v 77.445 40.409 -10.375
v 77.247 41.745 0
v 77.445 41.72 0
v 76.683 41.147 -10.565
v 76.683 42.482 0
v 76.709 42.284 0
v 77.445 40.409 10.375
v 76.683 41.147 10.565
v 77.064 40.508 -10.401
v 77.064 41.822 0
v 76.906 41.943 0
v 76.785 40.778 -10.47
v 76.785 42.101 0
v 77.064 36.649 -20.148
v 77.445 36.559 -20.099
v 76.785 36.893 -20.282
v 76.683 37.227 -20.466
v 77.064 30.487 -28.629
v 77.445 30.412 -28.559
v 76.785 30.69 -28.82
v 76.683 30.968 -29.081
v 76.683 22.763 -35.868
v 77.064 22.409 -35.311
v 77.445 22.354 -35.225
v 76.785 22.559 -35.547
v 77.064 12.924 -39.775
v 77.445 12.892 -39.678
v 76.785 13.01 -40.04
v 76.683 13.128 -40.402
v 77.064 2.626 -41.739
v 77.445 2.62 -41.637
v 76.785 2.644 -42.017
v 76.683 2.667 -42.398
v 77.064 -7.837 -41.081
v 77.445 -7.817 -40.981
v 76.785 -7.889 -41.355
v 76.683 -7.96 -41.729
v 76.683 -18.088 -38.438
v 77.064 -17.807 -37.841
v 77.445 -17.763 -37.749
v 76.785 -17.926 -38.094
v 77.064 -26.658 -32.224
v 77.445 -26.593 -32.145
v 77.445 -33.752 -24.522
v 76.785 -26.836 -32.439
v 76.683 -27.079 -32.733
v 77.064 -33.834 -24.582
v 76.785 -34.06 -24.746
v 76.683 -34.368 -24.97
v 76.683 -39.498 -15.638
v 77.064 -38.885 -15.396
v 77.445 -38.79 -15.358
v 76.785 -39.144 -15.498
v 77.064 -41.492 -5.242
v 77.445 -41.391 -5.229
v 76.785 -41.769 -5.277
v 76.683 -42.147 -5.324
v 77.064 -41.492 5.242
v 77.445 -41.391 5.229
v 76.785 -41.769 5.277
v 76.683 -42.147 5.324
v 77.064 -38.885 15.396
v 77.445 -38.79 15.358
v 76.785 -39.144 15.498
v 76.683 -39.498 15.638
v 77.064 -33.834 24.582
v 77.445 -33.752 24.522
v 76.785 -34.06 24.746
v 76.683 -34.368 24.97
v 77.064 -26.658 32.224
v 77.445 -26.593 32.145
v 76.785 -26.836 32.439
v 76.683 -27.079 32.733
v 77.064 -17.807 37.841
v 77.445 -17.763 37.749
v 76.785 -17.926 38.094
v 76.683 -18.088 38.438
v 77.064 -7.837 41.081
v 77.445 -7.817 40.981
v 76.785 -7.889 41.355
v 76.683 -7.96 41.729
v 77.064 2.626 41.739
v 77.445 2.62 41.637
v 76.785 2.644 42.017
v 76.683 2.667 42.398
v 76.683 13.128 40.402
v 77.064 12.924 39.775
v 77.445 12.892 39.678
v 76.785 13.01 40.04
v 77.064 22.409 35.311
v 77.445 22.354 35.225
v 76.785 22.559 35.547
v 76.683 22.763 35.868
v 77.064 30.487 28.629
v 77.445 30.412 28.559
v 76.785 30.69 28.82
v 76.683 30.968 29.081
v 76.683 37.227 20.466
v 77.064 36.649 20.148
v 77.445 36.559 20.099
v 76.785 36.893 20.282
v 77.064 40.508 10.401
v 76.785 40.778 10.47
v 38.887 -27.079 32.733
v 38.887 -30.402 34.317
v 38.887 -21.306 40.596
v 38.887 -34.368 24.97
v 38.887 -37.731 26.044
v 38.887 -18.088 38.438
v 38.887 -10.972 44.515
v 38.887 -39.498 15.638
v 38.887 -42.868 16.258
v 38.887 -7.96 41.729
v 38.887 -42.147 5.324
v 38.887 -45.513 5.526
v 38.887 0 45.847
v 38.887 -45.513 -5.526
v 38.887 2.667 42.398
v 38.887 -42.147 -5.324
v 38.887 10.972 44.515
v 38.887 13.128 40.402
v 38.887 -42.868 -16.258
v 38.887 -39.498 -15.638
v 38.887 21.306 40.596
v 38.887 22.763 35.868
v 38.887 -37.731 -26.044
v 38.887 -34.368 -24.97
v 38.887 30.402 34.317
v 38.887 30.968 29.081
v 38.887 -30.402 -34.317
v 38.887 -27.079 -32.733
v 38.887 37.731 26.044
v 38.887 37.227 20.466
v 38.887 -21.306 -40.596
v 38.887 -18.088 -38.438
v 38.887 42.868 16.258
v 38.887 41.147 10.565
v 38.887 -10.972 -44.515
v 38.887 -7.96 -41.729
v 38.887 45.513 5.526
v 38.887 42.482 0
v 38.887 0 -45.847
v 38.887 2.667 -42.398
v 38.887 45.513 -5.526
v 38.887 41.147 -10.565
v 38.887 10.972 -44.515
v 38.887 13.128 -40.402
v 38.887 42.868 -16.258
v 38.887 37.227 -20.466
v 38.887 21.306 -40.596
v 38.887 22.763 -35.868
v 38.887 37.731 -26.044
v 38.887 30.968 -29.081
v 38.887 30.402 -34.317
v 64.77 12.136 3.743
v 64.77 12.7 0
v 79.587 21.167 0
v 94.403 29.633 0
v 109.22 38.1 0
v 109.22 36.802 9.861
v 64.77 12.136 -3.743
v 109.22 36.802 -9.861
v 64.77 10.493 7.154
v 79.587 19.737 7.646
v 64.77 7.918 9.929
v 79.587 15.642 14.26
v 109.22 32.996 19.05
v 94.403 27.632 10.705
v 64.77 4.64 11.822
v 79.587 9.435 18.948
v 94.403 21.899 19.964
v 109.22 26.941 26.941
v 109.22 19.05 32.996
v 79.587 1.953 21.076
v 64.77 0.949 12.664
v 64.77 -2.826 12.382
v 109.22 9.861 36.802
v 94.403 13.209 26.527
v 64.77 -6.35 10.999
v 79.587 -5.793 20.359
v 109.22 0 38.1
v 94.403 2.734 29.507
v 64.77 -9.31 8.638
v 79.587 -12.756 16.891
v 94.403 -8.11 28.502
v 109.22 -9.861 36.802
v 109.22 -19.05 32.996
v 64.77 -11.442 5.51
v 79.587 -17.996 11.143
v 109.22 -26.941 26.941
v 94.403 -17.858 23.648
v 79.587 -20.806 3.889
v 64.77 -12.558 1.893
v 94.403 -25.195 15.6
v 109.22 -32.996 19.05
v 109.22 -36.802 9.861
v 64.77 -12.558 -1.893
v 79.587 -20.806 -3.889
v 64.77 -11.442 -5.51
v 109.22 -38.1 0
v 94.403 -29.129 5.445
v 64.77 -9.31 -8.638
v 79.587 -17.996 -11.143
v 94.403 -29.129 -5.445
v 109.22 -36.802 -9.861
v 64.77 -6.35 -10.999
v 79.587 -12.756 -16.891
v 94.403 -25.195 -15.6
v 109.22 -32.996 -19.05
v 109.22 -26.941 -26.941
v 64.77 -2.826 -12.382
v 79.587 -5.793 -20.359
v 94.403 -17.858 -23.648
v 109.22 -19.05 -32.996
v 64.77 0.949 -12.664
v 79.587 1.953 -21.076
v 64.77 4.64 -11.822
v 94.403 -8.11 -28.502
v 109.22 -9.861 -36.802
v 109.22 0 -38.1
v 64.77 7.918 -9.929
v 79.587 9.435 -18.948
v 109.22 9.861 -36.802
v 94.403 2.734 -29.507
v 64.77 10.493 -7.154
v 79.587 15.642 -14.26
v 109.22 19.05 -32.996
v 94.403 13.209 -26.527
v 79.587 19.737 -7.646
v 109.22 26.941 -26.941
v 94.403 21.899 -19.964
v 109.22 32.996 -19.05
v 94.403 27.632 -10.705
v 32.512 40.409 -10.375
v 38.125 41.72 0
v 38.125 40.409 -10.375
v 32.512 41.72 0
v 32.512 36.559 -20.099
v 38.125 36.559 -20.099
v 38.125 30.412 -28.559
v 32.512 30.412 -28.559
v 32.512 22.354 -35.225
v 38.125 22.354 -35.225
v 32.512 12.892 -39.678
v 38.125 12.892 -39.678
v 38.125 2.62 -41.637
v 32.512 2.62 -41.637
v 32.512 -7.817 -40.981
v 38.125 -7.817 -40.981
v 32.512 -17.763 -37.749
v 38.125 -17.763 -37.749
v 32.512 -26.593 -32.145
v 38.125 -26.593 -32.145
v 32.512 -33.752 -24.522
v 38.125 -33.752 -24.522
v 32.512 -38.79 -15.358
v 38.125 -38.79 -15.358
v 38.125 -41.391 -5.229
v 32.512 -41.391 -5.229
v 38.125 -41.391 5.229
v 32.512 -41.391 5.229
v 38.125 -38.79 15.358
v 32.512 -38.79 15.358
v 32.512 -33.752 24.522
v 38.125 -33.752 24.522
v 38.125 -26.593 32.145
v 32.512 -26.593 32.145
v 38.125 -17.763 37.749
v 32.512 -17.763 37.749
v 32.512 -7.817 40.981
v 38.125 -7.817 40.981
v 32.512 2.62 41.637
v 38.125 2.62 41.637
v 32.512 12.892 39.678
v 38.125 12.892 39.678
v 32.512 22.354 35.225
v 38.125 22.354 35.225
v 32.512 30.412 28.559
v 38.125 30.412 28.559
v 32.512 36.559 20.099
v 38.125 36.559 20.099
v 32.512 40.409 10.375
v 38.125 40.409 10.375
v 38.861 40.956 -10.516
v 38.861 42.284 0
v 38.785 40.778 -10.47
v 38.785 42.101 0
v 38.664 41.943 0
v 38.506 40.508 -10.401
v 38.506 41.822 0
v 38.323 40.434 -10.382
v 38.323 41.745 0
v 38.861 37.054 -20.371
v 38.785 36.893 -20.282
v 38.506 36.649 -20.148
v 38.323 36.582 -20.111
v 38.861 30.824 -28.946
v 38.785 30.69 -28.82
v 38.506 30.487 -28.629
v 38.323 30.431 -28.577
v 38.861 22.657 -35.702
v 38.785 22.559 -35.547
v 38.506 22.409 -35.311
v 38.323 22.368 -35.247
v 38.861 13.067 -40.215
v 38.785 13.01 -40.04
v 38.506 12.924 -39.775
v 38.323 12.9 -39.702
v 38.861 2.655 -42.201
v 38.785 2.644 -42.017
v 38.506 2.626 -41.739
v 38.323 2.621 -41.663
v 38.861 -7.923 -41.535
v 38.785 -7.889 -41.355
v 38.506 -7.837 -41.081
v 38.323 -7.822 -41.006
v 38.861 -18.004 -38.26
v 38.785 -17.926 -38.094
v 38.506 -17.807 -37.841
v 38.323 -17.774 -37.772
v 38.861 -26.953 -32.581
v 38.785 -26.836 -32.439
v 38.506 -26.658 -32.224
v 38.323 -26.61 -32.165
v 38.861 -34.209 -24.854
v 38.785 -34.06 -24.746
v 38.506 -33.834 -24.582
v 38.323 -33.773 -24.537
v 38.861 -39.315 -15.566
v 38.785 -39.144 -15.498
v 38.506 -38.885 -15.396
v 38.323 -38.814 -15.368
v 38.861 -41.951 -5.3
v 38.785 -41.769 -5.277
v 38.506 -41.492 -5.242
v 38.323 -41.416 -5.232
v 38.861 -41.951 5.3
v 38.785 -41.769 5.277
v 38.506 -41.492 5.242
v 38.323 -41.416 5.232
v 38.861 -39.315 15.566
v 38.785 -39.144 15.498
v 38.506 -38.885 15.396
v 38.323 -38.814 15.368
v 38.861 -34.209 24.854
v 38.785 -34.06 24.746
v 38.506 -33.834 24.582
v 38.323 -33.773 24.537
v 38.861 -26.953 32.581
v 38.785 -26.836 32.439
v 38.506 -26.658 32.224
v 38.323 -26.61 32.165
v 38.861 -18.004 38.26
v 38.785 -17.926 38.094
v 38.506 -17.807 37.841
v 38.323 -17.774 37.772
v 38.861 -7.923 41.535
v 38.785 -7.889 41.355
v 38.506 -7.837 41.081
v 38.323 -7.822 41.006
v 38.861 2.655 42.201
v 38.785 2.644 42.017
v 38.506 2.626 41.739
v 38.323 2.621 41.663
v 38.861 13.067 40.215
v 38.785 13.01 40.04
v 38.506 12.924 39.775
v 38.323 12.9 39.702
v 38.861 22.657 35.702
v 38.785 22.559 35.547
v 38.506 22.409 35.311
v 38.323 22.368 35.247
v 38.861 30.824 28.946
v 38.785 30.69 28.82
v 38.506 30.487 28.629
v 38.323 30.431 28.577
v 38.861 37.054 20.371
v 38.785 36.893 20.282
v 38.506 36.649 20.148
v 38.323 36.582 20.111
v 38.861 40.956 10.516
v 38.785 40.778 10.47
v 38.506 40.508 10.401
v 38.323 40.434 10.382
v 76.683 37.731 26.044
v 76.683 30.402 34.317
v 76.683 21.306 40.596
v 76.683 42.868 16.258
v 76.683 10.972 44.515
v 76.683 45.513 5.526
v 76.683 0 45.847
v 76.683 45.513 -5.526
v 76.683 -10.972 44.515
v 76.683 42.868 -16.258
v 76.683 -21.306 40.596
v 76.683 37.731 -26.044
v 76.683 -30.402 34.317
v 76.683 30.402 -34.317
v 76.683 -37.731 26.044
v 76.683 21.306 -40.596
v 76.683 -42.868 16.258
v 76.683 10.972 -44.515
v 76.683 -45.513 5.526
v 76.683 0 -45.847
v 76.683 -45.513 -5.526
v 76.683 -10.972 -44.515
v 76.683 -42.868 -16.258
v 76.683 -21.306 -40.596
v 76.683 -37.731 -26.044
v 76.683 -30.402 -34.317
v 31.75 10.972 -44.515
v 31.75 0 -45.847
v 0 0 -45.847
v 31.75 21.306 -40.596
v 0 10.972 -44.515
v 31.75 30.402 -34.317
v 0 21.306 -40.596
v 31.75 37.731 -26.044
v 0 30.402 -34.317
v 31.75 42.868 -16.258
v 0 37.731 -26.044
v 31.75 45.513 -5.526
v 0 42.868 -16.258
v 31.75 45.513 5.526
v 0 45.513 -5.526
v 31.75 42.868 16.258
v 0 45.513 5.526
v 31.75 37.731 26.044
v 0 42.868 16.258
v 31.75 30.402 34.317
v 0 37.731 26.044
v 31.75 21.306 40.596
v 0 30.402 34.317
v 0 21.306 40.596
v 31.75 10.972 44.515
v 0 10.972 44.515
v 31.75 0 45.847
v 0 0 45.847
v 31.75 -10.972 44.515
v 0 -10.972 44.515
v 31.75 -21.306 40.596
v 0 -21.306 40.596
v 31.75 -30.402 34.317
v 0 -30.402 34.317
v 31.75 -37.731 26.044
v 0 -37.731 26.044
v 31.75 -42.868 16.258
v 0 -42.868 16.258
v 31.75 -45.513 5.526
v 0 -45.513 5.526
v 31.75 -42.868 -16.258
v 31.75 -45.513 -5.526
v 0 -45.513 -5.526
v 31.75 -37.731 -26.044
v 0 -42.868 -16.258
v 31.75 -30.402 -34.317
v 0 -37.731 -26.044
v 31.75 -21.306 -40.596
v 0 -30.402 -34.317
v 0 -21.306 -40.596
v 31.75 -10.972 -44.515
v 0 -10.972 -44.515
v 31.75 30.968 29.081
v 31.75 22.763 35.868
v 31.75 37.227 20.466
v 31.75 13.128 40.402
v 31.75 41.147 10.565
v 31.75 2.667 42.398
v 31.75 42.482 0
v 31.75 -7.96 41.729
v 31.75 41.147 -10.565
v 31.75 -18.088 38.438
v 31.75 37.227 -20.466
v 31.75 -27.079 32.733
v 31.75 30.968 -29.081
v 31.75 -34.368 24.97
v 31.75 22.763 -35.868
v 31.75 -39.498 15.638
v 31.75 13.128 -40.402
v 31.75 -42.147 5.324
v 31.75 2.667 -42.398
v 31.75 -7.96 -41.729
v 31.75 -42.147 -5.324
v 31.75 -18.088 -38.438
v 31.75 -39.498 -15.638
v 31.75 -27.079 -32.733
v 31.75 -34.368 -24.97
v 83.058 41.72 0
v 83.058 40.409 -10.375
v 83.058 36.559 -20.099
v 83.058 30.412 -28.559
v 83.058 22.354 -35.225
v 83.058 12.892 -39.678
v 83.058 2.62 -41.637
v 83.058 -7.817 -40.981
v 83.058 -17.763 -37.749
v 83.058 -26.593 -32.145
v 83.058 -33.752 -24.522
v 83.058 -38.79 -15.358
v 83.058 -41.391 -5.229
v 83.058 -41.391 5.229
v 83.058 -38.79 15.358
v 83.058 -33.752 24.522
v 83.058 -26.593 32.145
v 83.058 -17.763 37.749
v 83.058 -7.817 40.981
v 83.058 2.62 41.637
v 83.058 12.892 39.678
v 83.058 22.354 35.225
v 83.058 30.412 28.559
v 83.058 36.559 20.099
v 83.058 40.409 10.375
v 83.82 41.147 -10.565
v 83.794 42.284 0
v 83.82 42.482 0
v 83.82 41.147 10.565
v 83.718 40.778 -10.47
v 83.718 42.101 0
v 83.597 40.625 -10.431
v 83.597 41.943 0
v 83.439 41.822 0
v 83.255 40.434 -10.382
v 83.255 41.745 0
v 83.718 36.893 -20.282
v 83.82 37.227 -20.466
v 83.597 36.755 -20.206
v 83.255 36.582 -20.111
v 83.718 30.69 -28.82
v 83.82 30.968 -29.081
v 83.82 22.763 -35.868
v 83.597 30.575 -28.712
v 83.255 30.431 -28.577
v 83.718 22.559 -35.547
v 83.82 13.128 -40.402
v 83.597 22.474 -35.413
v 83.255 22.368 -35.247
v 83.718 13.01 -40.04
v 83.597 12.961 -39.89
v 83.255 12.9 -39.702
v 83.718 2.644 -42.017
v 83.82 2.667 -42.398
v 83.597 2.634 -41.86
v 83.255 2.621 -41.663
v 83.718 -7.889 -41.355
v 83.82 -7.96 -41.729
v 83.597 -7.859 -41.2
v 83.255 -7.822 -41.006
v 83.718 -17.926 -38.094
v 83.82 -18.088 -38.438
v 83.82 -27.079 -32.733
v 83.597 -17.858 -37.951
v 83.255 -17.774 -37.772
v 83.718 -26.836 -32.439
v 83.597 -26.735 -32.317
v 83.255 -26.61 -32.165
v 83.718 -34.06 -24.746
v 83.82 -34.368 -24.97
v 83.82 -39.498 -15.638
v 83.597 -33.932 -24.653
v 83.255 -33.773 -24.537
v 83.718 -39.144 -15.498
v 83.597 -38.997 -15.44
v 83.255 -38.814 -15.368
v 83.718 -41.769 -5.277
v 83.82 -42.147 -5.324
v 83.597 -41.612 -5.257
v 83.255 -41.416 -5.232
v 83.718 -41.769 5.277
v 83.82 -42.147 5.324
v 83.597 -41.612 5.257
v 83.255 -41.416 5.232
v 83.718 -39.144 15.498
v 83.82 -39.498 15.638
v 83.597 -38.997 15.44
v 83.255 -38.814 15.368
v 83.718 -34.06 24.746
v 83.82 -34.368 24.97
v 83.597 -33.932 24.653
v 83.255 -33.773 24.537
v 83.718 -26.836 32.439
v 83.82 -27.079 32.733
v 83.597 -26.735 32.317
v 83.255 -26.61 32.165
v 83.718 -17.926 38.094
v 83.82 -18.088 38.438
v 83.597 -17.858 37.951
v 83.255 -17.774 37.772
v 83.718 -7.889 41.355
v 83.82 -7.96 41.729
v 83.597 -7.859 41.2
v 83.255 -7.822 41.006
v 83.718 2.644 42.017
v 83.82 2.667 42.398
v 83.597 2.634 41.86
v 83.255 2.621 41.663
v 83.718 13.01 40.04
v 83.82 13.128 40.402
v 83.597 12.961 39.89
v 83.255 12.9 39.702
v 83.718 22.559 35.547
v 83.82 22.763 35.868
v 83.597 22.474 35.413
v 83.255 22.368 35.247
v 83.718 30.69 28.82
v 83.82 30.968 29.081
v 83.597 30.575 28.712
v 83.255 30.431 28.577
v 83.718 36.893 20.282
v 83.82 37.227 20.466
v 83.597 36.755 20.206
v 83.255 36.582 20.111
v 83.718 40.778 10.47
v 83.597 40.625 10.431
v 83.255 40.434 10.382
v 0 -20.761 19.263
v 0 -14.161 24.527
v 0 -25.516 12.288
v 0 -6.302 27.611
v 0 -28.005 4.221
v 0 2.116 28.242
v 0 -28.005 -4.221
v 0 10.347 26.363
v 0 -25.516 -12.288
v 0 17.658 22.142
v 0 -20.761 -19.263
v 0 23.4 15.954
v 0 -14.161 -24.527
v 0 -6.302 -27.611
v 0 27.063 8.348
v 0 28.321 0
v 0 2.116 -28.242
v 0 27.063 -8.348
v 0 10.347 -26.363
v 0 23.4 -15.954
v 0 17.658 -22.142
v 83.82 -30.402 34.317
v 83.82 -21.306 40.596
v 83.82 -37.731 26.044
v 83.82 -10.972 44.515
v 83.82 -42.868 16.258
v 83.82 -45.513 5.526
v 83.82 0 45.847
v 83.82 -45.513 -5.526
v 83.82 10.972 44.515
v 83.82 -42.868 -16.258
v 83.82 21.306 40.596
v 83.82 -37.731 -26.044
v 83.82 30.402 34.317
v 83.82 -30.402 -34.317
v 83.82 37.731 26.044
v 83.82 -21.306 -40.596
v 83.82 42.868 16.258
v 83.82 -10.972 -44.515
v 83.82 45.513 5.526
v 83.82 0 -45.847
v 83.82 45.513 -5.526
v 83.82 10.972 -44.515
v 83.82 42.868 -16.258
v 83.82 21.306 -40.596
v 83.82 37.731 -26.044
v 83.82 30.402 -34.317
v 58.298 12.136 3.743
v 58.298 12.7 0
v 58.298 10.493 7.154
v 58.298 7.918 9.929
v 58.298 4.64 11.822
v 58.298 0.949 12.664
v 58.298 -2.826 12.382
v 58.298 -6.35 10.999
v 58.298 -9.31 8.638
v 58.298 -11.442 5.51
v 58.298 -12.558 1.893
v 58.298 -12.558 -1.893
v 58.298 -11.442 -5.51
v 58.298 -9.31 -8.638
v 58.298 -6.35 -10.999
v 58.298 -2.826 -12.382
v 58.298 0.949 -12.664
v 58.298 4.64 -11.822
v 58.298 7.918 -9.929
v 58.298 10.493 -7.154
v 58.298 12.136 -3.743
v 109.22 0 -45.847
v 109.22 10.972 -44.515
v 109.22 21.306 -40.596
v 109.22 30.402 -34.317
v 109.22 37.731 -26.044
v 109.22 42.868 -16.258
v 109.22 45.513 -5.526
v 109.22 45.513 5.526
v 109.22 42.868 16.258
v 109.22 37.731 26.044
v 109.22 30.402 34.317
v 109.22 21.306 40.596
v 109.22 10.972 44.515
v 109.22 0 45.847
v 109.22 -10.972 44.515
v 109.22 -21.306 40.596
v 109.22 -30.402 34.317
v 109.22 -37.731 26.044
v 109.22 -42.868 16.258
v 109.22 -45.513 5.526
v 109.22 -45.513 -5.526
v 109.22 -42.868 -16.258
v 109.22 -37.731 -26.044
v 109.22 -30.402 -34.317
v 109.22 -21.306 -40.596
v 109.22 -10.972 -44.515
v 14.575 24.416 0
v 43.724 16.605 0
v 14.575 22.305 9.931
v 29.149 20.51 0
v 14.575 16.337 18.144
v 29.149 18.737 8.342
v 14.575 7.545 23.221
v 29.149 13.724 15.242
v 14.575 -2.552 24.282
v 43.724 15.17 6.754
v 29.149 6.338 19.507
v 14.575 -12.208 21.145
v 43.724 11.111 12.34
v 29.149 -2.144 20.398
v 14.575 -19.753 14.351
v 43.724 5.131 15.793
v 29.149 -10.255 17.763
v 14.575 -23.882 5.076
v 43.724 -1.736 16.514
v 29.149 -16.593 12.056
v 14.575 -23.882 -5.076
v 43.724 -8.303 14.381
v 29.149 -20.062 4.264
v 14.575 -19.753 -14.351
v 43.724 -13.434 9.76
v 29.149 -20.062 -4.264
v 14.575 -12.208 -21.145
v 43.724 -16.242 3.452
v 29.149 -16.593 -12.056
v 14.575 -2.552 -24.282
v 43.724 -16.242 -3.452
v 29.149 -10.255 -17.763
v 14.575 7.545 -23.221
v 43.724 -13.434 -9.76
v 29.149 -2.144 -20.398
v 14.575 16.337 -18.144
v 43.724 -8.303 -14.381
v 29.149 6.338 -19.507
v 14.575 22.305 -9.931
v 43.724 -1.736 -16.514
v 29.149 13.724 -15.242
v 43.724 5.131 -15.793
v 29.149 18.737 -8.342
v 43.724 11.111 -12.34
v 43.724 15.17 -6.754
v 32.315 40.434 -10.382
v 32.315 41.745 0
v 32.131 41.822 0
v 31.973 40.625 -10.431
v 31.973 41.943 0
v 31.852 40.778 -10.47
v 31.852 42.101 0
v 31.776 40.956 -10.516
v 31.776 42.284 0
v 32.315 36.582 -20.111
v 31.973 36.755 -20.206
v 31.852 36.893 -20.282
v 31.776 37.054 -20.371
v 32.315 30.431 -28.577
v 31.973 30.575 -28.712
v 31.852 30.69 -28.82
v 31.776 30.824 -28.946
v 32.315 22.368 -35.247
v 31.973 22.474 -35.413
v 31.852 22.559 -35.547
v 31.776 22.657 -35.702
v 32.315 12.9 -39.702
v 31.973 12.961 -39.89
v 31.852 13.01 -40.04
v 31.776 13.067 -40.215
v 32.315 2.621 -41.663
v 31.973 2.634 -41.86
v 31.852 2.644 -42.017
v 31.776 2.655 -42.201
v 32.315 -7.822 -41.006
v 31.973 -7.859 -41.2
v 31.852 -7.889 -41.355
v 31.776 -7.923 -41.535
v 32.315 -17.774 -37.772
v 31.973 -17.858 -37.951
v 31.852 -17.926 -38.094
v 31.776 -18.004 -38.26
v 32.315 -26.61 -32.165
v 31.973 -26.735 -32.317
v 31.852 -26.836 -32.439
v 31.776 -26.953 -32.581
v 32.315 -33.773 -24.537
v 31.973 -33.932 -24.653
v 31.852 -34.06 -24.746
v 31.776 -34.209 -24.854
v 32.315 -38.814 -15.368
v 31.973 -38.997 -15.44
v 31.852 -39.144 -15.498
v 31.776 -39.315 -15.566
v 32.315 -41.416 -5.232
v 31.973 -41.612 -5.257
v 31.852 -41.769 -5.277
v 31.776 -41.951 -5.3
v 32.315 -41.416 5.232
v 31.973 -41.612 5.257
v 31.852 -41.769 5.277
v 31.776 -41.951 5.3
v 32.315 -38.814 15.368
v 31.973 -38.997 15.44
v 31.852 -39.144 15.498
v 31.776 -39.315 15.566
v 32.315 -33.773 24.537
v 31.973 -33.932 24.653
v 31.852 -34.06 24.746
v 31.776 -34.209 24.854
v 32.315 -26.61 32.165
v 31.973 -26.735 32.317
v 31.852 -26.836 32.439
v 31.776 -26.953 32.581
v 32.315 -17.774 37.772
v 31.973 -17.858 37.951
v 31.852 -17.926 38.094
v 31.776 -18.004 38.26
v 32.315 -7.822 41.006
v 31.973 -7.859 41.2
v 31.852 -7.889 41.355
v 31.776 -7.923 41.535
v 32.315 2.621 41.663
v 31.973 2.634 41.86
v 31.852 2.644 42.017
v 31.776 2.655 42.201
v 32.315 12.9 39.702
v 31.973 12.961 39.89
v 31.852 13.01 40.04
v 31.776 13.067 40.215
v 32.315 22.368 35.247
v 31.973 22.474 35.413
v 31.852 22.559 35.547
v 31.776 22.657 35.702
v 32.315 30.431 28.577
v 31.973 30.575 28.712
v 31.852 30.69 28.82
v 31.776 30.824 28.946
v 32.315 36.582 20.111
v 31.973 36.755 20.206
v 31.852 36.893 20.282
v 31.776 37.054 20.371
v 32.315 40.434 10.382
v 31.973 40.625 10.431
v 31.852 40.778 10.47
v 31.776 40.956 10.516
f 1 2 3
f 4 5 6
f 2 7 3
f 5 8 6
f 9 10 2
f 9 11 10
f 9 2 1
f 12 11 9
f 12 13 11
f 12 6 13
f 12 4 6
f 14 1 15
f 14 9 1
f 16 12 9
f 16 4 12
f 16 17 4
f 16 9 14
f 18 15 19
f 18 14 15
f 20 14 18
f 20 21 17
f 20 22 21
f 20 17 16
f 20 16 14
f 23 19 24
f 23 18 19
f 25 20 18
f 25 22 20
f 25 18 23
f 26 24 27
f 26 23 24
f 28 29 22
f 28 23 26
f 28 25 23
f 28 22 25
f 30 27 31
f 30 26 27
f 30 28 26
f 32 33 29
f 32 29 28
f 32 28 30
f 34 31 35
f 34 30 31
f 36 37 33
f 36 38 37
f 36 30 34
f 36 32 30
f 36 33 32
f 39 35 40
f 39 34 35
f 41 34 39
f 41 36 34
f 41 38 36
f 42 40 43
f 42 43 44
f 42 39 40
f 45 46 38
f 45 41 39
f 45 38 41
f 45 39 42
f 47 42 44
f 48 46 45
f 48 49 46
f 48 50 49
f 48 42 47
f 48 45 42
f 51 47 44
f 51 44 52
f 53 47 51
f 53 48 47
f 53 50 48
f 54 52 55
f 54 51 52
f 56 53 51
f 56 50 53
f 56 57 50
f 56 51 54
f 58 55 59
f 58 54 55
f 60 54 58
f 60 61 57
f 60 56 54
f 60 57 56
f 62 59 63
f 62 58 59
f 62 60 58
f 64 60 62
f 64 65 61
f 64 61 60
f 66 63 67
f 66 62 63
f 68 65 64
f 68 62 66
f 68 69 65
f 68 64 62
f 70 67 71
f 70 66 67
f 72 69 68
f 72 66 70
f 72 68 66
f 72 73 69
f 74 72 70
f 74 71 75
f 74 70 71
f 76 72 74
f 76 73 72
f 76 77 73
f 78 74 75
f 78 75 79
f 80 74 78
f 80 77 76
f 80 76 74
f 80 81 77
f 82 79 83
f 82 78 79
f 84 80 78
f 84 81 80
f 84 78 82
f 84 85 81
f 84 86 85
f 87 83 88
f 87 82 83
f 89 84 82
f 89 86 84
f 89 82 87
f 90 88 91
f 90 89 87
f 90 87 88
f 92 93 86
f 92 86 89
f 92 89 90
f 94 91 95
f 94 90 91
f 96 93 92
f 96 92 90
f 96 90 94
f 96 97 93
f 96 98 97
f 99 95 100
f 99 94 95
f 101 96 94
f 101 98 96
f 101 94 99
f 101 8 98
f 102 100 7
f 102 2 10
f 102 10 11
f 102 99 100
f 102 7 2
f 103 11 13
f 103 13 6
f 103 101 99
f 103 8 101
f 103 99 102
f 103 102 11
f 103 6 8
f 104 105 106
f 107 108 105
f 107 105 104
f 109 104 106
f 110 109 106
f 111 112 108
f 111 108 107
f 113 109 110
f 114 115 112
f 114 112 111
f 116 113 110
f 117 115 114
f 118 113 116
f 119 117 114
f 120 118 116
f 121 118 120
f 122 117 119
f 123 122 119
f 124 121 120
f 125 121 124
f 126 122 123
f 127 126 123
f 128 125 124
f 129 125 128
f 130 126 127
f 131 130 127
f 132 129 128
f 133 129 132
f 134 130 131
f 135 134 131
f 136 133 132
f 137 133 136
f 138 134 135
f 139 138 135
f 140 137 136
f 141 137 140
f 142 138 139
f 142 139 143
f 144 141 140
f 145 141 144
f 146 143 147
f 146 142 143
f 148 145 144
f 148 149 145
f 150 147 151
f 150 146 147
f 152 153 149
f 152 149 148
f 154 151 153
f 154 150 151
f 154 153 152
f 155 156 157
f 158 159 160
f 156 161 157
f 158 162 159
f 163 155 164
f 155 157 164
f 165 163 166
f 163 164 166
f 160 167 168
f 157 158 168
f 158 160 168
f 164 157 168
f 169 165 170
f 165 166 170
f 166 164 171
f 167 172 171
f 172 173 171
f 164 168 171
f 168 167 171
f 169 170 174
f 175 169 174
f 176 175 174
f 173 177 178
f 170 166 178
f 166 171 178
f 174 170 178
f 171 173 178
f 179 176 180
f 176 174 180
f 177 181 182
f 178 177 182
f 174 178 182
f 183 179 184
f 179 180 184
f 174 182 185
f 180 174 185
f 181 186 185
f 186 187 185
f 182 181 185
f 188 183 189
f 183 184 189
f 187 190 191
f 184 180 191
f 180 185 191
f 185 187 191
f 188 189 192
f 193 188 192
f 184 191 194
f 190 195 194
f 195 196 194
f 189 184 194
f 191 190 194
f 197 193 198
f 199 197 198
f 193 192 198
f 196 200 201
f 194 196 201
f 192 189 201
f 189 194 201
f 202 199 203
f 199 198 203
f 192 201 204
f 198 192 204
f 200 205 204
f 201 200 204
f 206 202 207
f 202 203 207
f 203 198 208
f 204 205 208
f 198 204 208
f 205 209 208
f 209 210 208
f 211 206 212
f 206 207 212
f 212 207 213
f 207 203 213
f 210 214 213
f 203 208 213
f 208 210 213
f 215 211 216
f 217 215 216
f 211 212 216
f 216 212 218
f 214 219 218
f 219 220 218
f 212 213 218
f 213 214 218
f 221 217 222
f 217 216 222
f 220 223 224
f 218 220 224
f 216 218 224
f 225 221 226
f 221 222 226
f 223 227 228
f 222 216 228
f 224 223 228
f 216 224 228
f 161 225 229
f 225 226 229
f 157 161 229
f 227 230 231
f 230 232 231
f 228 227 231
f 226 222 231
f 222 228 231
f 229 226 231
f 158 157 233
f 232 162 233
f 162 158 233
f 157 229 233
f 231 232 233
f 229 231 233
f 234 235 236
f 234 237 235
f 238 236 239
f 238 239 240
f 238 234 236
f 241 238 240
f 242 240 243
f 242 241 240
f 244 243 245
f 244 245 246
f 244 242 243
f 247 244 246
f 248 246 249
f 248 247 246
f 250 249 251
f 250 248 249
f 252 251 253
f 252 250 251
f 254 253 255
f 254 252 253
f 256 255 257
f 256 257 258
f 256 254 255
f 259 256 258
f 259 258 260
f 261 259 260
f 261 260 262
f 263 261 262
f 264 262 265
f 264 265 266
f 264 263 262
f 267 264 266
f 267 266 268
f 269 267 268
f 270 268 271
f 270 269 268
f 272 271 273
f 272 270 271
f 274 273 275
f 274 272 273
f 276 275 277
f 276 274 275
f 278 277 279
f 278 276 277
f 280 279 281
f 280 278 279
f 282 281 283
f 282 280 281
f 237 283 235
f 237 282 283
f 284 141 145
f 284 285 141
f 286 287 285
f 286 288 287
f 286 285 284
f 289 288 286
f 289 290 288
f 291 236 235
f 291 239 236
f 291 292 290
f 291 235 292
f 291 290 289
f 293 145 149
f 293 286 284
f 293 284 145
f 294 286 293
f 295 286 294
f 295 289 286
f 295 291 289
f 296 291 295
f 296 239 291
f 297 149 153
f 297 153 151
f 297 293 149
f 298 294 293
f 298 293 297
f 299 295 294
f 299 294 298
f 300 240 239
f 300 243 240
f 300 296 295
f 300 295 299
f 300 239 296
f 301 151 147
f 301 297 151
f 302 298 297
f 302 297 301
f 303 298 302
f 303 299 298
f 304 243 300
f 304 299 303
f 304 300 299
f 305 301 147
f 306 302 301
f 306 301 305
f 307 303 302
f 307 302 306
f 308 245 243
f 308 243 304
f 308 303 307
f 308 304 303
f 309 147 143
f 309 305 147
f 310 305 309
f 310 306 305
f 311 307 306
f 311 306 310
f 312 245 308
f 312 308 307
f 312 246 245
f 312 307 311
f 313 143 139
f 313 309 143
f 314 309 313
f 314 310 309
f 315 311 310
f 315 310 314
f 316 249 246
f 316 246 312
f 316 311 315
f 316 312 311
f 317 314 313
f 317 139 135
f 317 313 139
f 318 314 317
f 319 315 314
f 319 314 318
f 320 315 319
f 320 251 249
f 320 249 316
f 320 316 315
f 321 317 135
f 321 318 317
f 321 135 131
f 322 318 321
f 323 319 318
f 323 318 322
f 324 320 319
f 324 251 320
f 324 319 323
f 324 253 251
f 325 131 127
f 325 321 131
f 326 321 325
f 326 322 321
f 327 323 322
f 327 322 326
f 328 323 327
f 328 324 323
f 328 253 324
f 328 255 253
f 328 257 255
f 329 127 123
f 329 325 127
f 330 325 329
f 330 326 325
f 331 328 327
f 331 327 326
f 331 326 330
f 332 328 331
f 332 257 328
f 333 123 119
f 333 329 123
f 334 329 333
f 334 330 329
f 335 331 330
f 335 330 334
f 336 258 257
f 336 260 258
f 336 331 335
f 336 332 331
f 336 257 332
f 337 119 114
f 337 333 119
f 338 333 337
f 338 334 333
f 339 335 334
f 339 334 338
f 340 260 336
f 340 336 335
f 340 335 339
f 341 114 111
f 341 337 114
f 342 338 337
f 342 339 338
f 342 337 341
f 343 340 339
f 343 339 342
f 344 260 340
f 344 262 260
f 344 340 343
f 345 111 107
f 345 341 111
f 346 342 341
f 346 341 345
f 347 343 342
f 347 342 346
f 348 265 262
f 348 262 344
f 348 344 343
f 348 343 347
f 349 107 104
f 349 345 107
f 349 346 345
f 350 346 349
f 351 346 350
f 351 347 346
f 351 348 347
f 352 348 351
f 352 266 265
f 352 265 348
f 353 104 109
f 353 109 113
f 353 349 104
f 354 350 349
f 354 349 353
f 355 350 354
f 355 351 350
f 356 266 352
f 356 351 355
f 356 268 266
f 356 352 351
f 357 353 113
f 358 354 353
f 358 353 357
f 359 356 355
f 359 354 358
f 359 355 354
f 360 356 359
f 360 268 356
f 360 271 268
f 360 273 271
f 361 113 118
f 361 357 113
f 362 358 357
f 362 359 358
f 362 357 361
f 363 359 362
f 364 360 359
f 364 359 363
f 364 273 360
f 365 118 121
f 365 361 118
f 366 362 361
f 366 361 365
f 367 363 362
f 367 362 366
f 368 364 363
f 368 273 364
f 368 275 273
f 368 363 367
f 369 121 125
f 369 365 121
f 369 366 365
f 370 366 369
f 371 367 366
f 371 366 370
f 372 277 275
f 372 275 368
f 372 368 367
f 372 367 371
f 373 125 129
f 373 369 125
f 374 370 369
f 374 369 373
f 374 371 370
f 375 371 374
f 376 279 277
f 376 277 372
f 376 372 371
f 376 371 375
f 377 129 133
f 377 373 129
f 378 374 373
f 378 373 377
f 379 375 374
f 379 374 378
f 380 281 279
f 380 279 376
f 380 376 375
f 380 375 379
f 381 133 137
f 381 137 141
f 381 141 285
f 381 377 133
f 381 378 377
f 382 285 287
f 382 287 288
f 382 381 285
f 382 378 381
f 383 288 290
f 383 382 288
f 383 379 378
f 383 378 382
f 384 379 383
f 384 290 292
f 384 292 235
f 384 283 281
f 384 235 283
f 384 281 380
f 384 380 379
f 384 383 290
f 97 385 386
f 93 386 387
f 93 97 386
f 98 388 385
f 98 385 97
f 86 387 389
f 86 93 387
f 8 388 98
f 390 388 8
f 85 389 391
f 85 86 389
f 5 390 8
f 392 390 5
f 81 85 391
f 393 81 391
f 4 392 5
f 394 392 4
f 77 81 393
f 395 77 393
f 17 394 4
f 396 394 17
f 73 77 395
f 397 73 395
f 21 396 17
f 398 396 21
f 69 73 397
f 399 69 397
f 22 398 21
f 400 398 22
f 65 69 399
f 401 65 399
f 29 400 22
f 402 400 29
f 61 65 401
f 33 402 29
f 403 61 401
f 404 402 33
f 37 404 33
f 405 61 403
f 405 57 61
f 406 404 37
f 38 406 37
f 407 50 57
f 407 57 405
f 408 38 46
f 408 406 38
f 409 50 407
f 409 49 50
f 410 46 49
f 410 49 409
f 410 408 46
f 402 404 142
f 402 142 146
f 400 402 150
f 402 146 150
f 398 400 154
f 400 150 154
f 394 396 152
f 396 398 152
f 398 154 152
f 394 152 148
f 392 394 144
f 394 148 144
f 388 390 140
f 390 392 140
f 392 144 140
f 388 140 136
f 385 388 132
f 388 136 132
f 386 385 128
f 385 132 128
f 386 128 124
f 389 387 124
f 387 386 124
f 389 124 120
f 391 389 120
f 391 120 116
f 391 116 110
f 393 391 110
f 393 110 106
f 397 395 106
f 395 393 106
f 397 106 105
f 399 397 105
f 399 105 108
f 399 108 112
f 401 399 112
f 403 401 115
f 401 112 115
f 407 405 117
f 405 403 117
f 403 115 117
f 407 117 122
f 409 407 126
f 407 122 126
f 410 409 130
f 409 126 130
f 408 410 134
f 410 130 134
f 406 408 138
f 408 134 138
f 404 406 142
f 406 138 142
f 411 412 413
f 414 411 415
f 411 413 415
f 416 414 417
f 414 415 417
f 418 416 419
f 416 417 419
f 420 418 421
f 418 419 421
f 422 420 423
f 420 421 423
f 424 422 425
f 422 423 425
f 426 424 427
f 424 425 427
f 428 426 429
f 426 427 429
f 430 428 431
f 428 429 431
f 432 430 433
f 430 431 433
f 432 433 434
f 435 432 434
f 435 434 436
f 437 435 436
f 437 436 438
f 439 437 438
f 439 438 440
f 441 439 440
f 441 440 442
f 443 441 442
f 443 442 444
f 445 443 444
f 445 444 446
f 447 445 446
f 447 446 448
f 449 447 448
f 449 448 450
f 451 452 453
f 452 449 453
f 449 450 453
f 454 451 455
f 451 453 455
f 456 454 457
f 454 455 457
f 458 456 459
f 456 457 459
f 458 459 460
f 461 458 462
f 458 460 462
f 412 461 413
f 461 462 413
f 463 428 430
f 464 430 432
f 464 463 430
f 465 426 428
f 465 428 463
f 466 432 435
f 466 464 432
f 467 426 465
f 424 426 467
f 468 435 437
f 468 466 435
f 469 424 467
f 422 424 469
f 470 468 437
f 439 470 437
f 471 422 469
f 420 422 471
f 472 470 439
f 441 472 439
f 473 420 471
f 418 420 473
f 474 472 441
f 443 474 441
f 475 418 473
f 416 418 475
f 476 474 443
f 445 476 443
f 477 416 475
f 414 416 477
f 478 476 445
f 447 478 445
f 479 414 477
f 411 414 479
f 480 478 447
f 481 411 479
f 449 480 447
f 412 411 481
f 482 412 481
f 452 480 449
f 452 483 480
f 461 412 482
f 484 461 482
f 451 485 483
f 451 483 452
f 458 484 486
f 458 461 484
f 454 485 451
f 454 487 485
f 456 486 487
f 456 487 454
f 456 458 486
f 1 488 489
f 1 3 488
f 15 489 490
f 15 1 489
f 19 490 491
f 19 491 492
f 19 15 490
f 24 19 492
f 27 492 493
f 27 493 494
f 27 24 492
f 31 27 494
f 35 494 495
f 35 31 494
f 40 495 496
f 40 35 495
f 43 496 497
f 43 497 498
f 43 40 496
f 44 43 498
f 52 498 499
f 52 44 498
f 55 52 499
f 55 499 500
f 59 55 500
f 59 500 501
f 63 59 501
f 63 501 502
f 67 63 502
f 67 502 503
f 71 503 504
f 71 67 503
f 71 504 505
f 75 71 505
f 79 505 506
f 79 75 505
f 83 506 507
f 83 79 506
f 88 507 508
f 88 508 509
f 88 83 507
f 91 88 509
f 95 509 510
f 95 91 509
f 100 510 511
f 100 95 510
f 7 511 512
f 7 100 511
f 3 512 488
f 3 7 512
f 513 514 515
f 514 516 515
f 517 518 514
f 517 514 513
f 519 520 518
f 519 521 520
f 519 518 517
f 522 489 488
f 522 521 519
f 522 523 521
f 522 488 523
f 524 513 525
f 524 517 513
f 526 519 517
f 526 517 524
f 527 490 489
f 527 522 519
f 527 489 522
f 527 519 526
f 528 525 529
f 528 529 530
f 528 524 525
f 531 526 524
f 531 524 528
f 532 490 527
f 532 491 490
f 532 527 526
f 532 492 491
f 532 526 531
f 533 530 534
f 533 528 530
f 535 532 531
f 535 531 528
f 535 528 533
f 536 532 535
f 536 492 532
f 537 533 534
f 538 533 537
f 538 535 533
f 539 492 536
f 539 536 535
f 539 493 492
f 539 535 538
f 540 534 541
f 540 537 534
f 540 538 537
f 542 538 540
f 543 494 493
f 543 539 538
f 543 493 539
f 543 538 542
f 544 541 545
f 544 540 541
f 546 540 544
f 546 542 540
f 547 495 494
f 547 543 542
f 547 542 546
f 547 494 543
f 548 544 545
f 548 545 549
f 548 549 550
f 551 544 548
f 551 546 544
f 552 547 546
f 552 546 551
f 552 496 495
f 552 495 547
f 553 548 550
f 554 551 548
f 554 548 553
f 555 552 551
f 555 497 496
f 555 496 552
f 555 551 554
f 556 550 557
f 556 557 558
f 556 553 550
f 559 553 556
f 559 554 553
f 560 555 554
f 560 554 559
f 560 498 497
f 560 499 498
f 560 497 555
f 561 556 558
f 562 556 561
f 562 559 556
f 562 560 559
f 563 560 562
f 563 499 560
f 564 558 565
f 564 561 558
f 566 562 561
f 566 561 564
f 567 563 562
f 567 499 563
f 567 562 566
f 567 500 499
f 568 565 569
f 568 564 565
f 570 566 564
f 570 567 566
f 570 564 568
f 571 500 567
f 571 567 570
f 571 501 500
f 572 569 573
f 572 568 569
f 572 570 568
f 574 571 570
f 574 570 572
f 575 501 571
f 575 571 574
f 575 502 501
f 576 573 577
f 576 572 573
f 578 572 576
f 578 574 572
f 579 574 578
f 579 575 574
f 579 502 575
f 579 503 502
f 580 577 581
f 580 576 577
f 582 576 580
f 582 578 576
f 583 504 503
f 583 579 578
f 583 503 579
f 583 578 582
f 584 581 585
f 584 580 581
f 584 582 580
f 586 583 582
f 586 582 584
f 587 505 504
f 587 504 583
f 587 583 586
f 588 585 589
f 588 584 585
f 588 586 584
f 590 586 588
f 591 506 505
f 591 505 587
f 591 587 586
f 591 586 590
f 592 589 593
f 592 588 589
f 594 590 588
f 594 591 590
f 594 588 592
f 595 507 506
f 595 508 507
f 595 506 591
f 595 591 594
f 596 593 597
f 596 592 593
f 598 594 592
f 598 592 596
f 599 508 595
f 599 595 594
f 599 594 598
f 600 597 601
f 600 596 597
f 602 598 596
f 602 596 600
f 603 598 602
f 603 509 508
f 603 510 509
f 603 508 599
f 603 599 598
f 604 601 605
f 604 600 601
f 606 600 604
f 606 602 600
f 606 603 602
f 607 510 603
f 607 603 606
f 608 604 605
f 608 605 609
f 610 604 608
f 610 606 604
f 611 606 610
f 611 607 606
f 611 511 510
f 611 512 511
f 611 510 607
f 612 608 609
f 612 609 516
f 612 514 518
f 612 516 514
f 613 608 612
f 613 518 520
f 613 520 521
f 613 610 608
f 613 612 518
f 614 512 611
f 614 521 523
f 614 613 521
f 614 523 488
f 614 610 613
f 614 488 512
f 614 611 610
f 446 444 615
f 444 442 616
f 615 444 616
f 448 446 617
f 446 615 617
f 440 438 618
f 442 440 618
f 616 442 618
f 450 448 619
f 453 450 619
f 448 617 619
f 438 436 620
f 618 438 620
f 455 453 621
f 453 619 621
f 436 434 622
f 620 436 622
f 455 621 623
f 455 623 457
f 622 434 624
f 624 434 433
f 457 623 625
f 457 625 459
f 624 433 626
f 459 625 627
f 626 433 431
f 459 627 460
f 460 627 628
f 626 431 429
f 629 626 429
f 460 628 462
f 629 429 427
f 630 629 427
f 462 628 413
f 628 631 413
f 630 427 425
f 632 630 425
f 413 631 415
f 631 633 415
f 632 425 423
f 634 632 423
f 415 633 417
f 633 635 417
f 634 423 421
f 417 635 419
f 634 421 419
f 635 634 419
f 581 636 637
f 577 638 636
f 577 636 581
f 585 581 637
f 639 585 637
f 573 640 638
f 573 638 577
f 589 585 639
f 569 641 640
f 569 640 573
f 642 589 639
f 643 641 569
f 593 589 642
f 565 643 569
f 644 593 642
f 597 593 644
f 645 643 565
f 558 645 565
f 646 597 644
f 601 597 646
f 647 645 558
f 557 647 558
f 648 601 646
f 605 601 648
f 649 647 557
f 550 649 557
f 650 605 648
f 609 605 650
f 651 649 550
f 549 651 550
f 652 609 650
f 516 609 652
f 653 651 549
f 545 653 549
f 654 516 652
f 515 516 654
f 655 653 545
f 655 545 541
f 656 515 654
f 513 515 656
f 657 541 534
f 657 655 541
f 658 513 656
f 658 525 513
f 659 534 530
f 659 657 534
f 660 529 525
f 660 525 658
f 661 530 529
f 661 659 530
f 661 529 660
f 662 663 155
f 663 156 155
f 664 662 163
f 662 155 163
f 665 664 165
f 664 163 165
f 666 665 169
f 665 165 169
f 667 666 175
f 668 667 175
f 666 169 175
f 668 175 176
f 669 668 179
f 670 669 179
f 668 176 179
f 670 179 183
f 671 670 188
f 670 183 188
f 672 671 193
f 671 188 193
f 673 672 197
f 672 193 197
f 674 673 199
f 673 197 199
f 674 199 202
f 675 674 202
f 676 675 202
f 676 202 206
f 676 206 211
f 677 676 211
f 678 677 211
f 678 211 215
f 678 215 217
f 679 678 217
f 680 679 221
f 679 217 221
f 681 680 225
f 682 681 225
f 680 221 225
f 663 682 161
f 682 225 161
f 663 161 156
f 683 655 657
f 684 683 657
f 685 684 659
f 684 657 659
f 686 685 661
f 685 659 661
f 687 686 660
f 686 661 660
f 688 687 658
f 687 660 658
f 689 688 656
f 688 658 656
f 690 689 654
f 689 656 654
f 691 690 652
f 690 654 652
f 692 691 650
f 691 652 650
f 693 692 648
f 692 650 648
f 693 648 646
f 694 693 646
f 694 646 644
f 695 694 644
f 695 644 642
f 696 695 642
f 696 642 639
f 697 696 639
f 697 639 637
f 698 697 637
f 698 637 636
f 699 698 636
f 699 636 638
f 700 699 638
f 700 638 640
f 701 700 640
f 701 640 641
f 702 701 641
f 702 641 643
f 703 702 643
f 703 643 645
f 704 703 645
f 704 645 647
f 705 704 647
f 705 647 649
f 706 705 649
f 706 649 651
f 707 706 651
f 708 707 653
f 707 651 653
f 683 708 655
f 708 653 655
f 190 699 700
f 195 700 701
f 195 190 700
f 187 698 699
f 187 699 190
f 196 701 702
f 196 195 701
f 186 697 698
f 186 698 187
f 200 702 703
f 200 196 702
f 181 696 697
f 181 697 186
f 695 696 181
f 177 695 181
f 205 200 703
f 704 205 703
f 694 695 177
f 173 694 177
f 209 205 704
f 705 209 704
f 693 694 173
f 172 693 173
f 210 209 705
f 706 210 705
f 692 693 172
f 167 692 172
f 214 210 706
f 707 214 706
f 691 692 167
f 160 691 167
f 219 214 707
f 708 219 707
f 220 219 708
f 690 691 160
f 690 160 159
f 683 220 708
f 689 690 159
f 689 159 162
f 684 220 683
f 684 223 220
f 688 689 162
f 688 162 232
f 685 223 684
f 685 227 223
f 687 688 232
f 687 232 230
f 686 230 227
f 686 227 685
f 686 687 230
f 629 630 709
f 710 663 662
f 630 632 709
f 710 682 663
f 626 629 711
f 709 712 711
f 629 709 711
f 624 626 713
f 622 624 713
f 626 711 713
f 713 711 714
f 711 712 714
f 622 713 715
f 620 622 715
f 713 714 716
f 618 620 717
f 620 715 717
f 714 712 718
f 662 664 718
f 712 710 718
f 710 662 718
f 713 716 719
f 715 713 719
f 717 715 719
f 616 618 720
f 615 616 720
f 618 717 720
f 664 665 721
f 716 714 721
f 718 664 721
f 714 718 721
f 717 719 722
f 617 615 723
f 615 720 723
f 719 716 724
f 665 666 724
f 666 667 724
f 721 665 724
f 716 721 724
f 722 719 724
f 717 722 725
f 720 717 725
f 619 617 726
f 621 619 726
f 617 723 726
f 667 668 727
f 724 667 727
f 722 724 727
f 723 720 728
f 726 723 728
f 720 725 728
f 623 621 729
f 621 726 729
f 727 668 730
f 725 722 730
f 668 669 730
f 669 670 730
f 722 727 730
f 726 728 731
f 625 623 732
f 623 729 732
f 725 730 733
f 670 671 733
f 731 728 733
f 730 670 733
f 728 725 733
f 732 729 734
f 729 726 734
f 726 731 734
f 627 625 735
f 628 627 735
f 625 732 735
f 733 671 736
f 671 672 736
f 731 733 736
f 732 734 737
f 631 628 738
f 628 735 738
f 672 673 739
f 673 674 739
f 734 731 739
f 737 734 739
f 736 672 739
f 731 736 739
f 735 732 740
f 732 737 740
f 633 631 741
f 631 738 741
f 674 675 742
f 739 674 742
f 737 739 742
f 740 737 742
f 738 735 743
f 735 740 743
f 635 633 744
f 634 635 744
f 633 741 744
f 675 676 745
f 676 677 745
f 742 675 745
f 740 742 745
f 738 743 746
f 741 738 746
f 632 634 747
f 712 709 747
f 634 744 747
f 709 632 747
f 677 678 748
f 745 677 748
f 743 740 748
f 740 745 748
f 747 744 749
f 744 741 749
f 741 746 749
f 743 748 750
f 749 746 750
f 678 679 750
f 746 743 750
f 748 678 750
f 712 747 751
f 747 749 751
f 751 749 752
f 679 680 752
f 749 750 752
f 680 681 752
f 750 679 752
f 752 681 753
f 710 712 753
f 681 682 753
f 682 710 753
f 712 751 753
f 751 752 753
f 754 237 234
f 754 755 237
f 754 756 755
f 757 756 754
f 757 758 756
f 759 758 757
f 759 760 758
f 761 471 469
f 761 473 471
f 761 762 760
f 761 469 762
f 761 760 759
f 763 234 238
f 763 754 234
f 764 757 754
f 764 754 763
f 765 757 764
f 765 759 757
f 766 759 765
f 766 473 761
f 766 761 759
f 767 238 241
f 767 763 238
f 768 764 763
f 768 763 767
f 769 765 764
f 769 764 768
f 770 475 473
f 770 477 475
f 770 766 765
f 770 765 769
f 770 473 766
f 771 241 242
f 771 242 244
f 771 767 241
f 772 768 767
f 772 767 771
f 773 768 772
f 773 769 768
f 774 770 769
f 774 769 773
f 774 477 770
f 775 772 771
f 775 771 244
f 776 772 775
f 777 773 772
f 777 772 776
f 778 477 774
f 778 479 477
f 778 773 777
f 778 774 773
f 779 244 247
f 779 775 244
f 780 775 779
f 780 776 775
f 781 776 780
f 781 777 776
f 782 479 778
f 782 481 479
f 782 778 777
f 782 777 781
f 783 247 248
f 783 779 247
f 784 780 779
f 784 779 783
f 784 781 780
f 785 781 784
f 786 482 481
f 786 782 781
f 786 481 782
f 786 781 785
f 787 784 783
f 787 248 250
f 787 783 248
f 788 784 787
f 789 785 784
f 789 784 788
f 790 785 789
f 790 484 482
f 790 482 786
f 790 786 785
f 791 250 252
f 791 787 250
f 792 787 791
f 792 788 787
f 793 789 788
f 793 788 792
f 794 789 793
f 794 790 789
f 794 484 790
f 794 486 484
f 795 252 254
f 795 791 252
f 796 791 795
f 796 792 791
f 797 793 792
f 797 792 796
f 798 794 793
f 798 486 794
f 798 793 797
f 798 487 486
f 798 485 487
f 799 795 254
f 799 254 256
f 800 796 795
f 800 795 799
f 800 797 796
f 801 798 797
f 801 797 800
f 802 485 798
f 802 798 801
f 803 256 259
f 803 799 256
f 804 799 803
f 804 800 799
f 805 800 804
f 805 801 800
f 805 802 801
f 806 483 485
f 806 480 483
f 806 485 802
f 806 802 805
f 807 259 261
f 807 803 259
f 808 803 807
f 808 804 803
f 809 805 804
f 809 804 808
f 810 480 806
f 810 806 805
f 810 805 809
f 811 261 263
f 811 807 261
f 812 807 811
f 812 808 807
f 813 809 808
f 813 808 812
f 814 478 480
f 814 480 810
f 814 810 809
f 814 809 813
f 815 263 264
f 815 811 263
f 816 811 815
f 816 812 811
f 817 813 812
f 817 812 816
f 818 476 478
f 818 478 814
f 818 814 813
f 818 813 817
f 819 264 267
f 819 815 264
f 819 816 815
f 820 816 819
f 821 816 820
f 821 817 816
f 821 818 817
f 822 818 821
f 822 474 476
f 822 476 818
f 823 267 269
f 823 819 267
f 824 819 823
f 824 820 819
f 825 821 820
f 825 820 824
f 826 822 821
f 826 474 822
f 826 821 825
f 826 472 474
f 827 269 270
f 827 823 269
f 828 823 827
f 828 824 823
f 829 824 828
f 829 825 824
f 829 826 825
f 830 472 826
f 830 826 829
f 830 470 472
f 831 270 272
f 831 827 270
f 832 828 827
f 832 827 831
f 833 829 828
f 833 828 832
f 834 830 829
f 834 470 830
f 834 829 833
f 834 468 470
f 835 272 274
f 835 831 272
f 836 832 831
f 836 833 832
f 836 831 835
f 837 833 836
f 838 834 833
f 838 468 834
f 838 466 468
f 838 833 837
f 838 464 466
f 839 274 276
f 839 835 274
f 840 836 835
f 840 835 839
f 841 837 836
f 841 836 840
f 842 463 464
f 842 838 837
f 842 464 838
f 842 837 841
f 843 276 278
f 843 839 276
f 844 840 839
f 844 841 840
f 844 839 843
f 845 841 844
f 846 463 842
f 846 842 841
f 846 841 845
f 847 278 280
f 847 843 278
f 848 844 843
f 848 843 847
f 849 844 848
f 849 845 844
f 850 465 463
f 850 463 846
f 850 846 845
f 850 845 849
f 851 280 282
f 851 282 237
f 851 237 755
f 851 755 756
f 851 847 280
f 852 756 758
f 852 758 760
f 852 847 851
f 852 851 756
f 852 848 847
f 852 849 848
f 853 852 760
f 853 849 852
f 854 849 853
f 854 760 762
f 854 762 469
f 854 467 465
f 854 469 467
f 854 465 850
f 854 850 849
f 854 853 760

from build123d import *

# Parameters (mm, degrees)
SKETCH1_R           = 45.847
BOSS_EXTRUDE1_DEPTH = 109.22


with BuildPart() as part:
    # Sketch1 → Boss-Extrude1 (new body)
    with BuildSketch(Plane(origin=(0, 0, 0), x_dir=(0, 0, -1), z_dir=(1, 0, 0))):
        Circle(SKETCH1_R)
    extrude(amount=BOSS_EXTRUDE1_DEPTH)

    # Sketch3 → Cut-Revolve1 (revolve, cut)
    with BuildSketch(Plane.XY):
        Polygon((0, 0), (0, 28.321), (58.298365665, 12.7), (64.77, 12.7), (109.22, 38.1), (109.22, 0), align=None)
    revolve(axis=Axis((0, 0, 0), (1, 0, 0)), mode=Mode.SUBTRACT)

    # Sketch4 → Cut-Revolve2 (revolve, cut)
    with BuildSketch(Plane.XY):
        with BuildLine():
            Line((76.6826, 45.847), (83.82, 45.847))
            Line((83.82, 45.847), (83.82, 42.4815))
            ThreePointArc((83.82, 42.4815), (83.596815367, 41.942684633), (83.058, 41.7195))
            Line((83.058, 41.7195), (77.4446, 41.7195))
            ThreePointArc((77.4446, 41.7195), (76.905784633, 41.942684633), (76.6826, 42.4815))
            Line((76.6826, 42.4815), (76.6826, 45.847))
        make_face()
        with BuildLine():
            Line((31.75, 45.847), (38.8874, 45.847))
            Line((38.8874, 45.847), (38.8874, 42.4815))
            ThreePointArc((38.8874, 42.4815), (38.664215367, 41.942684633), (38.1254, 41.7195))
            Line((38.1254, 41.7195), (32.512, 41.7195))
            ThreePointArc((32.512, 41.7195), (31.973184633, 41.942684633), (31.75, 42.4815))
            Line((31.75, 42.4815), (31.75, 45.847))
        make_face()
    revolve(axis=Axis((0, 0, 0), (-1, 0, 0)), mode=Mode.SUBTRACT)


solid = part.part
